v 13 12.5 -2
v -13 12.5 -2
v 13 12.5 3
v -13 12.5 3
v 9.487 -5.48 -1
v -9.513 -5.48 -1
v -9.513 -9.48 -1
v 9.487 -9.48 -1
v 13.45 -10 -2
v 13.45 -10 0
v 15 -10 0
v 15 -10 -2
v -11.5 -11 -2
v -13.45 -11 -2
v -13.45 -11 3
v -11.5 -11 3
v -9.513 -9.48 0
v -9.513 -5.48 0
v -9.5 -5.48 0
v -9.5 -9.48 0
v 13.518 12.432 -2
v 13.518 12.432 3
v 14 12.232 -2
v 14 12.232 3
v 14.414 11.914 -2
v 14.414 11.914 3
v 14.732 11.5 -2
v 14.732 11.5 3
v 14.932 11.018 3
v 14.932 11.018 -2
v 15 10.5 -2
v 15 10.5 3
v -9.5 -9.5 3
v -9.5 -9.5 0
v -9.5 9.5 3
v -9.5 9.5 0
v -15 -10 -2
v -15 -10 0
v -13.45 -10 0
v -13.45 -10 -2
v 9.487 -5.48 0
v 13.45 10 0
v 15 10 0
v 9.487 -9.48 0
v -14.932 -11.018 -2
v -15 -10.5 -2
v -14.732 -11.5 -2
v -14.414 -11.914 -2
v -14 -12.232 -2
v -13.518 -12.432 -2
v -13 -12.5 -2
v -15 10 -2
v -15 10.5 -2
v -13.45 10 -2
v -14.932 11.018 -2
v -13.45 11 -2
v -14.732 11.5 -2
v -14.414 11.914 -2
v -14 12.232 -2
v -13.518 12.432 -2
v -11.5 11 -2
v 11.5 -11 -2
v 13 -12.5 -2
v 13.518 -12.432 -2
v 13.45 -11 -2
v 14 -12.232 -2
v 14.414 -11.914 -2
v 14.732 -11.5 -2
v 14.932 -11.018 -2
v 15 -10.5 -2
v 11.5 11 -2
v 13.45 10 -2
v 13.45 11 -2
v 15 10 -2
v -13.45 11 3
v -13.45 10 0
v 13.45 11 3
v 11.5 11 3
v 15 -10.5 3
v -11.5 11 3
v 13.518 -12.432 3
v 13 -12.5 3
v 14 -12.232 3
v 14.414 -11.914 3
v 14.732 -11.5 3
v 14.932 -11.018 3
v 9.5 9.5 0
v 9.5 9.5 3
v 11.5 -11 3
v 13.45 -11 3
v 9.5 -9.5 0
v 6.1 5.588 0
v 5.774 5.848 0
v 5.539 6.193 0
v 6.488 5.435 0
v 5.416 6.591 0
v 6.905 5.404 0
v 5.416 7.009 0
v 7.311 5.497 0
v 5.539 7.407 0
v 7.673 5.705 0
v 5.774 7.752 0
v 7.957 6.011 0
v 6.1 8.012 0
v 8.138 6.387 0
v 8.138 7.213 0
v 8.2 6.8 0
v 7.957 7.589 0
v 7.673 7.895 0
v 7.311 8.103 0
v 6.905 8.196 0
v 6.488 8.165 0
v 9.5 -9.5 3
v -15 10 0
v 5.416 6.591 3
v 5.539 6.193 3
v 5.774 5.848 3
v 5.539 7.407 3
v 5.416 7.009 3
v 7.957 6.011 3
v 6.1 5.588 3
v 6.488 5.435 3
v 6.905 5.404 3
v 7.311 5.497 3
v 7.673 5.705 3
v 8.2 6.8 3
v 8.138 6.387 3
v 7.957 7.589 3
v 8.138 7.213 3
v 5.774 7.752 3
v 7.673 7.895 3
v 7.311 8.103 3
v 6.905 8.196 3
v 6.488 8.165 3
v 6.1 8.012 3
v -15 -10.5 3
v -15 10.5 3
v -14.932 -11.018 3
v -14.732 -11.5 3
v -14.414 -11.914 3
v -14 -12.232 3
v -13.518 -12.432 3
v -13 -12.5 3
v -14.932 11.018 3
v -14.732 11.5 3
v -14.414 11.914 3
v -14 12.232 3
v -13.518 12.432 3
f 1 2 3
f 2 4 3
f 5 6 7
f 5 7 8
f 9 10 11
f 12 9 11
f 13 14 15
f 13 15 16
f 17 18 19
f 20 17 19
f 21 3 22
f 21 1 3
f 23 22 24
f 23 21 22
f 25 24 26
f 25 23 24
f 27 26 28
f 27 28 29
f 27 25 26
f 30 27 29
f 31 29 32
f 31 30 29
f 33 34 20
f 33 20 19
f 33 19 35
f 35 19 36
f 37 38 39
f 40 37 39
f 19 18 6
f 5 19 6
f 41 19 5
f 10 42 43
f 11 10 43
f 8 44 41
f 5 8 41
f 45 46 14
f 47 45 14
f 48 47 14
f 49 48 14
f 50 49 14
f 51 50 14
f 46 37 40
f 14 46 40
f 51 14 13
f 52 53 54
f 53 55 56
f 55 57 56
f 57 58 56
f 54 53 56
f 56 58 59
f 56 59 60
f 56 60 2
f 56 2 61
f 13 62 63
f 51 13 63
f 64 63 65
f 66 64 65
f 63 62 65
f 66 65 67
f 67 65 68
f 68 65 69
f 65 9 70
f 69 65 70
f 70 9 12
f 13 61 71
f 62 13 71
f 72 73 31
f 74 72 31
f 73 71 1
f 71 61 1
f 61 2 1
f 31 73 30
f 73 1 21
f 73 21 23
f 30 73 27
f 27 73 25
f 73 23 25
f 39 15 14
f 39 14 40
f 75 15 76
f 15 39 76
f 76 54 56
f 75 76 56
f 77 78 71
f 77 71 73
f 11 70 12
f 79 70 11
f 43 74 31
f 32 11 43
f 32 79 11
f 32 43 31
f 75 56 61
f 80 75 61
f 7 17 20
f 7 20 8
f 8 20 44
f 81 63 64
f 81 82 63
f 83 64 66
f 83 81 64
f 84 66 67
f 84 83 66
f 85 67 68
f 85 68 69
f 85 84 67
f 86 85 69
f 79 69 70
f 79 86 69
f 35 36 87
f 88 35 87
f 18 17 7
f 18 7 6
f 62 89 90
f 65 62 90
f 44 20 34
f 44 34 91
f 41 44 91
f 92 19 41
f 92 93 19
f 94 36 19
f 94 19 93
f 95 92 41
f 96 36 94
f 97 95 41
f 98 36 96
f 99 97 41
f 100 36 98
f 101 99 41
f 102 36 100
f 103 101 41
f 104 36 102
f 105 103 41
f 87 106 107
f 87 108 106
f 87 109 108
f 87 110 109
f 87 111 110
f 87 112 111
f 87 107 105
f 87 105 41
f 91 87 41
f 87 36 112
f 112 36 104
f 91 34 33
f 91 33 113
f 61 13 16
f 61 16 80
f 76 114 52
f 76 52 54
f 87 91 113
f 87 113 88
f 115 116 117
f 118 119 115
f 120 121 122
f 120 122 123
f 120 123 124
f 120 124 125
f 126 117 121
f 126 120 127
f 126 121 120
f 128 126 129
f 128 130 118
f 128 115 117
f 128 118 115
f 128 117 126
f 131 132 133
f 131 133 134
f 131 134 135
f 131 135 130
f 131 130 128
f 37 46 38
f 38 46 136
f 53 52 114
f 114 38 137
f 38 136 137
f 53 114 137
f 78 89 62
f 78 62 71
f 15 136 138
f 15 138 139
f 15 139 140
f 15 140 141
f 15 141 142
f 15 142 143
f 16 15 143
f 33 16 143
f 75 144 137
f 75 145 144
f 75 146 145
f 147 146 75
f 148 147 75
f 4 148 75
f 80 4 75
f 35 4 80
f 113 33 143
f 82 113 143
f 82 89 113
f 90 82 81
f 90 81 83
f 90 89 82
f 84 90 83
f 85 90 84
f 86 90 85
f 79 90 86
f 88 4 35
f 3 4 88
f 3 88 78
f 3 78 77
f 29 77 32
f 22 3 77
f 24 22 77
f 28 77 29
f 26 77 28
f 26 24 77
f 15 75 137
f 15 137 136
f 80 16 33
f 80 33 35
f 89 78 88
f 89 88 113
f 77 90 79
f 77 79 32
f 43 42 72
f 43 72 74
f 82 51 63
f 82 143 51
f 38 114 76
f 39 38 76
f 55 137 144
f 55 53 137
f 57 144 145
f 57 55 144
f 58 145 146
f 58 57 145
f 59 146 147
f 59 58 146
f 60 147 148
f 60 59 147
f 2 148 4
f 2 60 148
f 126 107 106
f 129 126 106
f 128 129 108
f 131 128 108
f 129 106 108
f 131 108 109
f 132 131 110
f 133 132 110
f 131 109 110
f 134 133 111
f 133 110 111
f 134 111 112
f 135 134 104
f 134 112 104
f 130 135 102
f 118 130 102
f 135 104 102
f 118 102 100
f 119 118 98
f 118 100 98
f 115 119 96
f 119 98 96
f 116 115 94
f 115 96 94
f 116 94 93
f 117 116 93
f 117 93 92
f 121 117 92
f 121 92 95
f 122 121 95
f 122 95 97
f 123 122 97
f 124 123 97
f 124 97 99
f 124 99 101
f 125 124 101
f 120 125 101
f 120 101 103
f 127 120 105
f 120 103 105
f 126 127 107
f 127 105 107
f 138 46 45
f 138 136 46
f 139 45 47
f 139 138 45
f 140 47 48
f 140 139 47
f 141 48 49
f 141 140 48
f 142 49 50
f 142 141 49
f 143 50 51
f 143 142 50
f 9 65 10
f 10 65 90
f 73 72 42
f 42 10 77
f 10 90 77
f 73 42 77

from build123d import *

# Parameters (mm, degrees)
F0_W      = 30
F0_H      = 25
F1_DEPTH  = 3
F2_W      = 19
F2_H      = 19
F3_DEPTH  = 5
F4_DEPTH  = 2
F5_W      = 1.949999
F5_H      = 22
F6_DEPTH  = 5
F7_R      = 2
F8_R      = 1.4
F9_DEPTH  = 3
F10_W     = 5
F10_H     = 20
F11_DEPTH = 2
F12_W     = 19
F12_H     = 4
F13_DEPTH = 1


with BuildPart() as f1:
    # F0 (on Top) → F1 (new body)
    with BuildSketch(Plane.XY):
        Rectangle(F0_W, F0_H)
    extrude(amount=F1_DEPTH)

    # F2 (on Top) → F3 (cut)
    with BuildSketch(Plane.XY):
        Rectangle(F2_W, F2_H)
    extrude(amount=F3_DEPTH, mode=Mode.SUBTRACT)

    # F0 (on Top) → F4 (join)
    with BuildSketch(Plane.XY):
        Rectangle(F0_W, F0_H)
    extrude(amount=-F4_DEPTH)

    # F5 (on Top) → F6 (cut, symmetric)
    with BuildSketch(Plane.XY):
        with Locations((-12.474999, 0)):
            Rectangle(F5_W, F5_H)
        with Locations((12.474999, 0)):
            Rectangle(F5_W, F5_H)
    extrude(amount=F6_DEPTH, both=True, mode=Mode.SUBTRACT)

    # F7
    f7_edges = [f1.edges().sort_by_distance(p)[0] for p in [
        (15, -12.5, 0.5),
        (15, 12.5, 0.5),
        (-15, -12.5, 0.5),
        (-15, 12.5, 0.5),
    ]]
    fillet(f7_edges, radius=F7_R)

    # F8 (on Top) → F9 (join)
    with BuildSketch(Plane.XY):
        with Locations((6.8, 6.8)):
            Circle(F8_R)
    extrude(amount=F9_DEPTH)

    # F10 (on Top) → F11 (cut)
    with BuildSketch(Plane.XY):
        with Locations((15, 0)):
            Rectangle(F10_W, F10_H)
        with Locations((-15, 0)):
            Rectangle(F10_W, F10_H)
    extrude(amount=-F11_DEPTH, mode=Mode.SUBTRACT)

    # F12 (on Top) → F13 (cut)
    with BuildSketch(Plane.XY):
        with Locations((-0.012709, -7.479958)):
            Rectangle(F12_W, F12_H)
    extrude(amount=-F13_DEPTH, mode=Mode.SUBTRACT)


solid = f1.part
